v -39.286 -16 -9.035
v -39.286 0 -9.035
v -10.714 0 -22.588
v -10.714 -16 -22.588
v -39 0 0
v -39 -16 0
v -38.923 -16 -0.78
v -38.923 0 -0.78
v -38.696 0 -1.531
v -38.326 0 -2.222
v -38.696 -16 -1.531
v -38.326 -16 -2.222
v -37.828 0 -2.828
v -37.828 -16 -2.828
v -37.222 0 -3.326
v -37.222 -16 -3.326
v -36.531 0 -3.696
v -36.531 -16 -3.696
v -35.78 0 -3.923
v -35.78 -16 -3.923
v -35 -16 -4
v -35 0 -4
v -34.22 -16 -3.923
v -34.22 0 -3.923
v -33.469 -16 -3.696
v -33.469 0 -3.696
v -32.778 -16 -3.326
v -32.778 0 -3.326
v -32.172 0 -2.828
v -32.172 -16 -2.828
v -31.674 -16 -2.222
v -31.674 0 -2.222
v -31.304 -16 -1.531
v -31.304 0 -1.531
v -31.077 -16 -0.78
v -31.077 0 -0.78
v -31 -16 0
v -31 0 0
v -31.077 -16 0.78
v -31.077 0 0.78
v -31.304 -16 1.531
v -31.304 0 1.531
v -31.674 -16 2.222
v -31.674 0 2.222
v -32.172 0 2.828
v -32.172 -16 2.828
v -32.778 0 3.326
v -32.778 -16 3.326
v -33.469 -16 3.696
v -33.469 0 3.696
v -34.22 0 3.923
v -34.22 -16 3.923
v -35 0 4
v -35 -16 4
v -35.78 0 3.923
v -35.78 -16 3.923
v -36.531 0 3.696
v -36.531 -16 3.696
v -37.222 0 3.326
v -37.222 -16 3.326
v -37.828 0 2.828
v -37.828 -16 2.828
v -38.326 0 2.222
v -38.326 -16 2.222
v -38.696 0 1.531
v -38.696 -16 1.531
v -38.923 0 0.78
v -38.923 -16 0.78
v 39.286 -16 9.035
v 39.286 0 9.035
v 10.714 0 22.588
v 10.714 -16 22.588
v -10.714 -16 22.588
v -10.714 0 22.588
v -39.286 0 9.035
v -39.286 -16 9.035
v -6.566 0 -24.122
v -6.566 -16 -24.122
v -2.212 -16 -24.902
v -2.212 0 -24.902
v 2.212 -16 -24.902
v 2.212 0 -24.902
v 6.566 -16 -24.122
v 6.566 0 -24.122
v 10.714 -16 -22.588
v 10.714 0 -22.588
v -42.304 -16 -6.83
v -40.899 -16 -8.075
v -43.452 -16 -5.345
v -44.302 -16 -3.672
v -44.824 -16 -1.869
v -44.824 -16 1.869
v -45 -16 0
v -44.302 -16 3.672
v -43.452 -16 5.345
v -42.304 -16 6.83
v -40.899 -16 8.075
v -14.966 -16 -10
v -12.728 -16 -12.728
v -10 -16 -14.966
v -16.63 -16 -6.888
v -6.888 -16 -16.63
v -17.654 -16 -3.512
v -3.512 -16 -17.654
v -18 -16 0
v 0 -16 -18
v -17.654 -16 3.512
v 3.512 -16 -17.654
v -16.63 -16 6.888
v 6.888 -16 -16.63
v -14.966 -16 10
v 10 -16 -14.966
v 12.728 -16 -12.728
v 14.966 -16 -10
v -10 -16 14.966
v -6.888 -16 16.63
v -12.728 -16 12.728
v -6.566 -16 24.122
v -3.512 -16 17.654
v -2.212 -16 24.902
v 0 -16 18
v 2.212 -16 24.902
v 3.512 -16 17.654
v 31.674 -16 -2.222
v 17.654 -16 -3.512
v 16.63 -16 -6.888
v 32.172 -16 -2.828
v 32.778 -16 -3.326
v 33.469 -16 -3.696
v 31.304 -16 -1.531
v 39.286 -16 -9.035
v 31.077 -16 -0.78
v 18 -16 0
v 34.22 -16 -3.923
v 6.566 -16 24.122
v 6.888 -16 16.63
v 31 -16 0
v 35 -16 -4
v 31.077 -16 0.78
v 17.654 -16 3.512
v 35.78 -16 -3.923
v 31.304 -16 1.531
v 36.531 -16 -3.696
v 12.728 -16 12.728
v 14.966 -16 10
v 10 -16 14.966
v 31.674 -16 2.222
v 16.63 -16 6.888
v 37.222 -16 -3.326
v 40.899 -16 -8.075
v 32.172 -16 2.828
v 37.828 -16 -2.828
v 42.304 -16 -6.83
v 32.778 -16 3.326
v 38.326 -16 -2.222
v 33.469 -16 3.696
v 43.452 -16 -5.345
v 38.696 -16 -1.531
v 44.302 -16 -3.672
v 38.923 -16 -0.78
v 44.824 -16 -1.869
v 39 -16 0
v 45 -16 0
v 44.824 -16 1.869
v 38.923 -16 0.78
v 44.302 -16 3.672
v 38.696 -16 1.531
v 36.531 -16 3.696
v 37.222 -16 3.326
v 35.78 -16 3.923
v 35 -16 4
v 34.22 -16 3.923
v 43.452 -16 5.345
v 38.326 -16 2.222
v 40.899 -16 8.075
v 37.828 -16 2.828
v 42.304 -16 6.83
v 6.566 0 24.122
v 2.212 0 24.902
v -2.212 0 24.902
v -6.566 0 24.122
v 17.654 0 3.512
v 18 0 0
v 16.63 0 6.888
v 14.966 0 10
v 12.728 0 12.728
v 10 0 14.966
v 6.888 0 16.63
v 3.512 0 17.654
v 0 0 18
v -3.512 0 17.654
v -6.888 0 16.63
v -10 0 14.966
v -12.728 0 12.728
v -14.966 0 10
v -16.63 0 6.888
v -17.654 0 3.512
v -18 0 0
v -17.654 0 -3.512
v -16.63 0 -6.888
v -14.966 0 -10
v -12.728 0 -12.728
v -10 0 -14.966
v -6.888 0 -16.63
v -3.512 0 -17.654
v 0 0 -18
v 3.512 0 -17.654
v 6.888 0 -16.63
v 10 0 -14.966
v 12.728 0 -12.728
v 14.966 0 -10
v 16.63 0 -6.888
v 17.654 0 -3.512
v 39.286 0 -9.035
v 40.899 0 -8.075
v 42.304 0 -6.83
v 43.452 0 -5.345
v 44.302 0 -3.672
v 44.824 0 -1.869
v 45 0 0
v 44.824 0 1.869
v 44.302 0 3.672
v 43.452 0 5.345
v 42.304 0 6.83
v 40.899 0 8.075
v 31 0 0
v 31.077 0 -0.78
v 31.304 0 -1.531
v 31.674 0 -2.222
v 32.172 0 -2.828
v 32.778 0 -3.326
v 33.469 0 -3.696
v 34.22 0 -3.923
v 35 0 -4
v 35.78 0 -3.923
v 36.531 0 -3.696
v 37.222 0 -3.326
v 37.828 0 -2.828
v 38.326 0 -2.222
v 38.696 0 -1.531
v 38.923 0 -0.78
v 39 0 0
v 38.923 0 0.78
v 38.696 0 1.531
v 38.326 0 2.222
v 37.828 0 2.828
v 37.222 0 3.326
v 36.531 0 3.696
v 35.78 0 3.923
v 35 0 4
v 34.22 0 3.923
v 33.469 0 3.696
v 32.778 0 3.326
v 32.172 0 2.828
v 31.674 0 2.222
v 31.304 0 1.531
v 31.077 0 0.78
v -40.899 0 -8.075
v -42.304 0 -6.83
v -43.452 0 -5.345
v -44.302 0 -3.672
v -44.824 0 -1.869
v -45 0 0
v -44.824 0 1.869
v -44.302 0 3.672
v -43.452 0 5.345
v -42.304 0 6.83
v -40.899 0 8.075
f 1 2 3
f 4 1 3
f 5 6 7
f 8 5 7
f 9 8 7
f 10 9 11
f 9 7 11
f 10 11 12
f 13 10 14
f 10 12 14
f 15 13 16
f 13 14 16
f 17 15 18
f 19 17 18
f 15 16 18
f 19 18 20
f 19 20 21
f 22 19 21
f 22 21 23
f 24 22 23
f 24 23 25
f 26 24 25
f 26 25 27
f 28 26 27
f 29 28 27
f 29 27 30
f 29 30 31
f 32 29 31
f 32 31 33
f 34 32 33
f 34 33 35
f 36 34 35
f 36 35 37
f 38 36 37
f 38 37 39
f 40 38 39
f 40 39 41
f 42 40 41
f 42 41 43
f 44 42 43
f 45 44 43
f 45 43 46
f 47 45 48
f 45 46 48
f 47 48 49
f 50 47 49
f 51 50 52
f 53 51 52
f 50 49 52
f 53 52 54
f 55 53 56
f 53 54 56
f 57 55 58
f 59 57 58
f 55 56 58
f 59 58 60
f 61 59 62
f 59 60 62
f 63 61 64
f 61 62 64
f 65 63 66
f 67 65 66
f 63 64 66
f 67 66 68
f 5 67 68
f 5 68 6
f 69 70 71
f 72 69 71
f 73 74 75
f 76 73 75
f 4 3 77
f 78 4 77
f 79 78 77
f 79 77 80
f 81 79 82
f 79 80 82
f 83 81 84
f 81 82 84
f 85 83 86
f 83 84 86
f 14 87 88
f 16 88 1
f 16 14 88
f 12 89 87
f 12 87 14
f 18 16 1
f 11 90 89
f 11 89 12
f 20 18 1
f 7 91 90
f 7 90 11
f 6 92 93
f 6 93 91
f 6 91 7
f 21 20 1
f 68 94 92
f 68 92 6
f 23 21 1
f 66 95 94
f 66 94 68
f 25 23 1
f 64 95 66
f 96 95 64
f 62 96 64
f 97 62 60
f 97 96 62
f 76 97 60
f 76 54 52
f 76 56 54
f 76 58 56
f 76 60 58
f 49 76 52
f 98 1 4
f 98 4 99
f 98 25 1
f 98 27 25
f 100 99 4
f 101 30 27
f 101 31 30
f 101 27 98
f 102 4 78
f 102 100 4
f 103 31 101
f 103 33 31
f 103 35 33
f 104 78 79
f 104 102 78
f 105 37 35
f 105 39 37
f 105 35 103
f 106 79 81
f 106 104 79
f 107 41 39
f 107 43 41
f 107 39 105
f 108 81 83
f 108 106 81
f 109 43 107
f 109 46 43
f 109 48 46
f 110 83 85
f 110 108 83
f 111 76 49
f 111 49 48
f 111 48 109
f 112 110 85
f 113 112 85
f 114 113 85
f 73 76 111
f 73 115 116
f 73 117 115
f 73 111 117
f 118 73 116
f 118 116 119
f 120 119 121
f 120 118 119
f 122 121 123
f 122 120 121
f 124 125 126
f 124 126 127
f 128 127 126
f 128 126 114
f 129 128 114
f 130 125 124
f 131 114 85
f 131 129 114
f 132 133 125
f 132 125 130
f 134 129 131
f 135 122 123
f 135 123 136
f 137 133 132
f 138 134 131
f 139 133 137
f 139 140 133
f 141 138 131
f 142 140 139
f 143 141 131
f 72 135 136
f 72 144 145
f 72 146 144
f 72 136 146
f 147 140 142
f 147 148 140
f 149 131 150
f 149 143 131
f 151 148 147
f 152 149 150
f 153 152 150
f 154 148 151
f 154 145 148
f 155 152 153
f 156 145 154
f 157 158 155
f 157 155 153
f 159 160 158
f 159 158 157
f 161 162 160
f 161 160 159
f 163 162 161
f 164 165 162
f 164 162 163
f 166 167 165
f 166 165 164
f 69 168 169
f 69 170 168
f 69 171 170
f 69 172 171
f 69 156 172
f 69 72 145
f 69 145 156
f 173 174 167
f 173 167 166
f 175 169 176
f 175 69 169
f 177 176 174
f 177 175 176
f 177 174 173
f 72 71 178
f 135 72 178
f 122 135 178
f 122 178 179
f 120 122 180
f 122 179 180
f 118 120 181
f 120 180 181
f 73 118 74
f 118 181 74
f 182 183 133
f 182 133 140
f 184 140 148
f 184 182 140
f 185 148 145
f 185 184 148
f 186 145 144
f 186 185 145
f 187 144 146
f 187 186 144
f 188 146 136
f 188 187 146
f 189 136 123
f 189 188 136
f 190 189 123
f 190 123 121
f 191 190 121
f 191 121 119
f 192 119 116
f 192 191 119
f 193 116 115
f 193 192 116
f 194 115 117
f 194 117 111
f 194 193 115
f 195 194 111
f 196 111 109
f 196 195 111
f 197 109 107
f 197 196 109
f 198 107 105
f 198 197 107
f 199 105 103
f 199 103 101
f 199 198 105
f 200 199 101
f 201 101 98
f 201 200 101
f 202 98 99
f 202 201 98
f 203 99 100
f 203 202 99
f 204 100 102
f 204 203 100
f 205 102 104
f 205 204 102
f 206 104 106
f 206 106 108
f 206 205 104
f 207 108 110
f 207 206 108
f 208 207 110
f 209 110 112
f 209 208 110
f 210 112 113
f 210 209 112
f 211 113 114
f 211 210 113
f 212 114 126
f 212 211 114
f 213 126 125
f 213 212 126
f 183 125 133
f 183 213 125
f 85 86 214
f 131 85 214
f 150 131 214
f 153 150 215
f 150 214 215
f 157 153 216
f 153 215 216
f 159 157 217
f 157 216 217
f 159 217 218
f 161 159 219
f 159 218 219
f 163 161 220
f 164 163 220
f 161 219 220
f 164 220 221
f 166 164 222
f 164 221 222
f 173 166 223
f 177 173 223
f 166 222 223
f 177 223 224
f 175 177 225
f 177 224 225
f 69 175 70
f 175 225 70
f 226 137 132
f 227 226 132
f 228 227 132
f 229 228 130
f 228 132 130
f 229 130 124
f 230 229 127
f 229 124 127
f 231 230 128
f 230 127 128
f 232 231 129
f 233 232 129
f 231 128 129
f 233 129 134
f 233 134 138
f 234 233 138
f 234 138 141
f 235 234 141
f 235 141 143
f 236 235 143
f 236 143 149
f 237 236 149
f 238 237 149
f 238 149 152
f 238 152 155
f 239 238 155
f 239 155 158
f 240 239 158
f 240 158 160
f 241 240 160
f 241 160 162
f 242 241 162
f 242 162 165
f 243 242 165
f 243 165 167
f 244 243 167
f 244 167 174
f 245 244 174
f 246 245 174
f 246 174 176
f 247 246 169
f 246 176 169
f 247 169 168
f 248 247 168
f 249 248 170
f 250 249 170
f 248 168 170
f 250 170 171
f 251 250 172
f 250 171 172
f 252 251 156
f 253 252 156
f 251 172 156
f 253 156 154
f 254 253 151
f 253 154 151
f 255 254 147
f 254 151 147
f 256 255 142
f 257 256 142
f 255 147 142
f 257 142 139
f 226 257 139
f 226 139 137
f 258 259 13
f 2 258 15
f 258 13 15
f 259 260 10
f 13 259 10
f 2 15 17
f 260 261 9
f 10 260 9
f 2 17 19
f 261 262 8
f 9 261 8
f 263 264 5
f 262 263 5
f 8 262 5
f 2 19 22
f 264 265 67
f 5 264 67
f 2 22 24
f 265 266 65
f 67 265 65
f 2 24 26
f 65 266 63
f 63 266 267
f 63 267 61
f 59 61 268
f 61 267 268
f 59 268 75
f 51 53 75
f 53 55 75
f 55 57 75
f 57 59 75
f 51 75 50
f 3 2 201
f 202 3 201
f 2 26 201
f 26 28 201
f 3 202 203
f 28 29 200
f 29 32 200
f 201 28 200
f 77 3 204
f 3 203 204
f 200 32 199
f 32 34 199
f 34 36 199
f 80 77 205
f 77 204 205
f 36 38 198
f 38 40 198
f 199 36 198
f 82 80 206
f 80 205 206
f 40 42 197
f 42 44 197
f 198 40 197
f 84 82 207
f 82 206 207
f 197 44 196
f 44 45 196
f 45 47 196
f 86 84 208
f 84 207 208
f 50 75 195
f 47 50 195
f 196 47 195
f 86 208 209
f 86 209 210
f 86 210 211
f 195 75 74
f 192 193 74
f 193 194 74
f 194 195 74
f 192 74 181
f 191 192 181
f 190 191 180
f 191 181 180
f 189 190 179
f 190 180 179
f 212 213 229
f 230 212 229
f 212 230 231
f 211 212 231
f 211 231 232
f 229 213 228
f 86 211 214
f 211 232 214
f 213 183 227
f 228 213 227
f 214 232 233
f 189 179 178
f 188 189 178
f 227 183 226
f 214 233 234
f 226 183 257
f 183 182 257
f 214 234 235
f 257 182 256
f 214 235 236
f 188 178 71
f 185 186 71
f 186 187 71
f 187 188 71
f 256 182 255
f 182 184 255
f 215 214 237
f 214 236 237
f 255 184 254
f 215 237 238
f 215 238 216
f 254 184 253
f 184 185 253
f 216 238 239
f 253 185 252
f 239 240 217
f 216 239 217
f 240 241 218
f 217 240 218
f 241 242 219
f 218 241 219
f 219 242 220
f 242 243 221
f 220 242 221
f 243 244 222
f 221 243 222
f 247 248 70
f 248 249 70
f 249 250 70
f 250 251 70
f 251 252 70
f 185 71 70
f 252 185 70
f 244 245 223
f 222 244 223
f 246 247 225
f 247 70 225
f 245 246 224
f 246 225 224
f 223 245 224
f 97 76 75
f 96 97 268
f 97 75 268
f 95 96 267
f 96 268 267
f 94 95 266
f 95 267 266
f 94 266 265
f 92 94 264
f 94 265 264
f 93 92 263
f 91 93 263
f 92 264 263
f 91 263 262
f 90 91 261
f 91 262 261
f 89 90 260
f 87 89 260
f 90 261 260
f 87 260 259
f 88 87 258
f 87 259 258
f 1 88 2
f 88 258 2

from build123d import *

# Parameters (mm, degrees)
F0_R     = 18
F1_DEPTH = 16
F2_D     = 8


with BuildPart() as f1:
    # F0 (on Front) → F1 (new body)
    with BuildSketch(Plane.XZ):
        with BuildLine():
            Line((-39.285714, -9.035079), (-10.714286, -22.587698))
            ThreePointArc((-10.714286, -22.587698), (0, -25), (10.714286, -22.587698))
            Line((10.714286, -22.587698), (39.285714, -9.035079))
            ThreePointArc((39.285714, -9.035079), (45, 0), (39.285714, 9.035079))
            Line((39.285714, 9.035079), (10.714286, 22.587698))
            ThreePointArc((10.714286, 22.587698), (0, 25), (-10.714286, 22.587698))
            Line((-10.714286, 22.587698), (-39.285714, 9.035079))
            ThreePointArc((-39.285714, 9.035079), (-45, 0), (-39.285714, -9.035079))
        make_face()
        Circle(F0_R, mode=Mode.SUBTRACT)
    extrude(amount=F1_DEPTH)

    # F2 (through all)
    with Locations(Plane(origin=(0, 0, 0), x_dir=(1, 0, 0), z_dir=(0, 1, 0))):
        with Locations((35, 0), (-35, 0)):
            Hole(F2_D / 2)


solid = f1.part
